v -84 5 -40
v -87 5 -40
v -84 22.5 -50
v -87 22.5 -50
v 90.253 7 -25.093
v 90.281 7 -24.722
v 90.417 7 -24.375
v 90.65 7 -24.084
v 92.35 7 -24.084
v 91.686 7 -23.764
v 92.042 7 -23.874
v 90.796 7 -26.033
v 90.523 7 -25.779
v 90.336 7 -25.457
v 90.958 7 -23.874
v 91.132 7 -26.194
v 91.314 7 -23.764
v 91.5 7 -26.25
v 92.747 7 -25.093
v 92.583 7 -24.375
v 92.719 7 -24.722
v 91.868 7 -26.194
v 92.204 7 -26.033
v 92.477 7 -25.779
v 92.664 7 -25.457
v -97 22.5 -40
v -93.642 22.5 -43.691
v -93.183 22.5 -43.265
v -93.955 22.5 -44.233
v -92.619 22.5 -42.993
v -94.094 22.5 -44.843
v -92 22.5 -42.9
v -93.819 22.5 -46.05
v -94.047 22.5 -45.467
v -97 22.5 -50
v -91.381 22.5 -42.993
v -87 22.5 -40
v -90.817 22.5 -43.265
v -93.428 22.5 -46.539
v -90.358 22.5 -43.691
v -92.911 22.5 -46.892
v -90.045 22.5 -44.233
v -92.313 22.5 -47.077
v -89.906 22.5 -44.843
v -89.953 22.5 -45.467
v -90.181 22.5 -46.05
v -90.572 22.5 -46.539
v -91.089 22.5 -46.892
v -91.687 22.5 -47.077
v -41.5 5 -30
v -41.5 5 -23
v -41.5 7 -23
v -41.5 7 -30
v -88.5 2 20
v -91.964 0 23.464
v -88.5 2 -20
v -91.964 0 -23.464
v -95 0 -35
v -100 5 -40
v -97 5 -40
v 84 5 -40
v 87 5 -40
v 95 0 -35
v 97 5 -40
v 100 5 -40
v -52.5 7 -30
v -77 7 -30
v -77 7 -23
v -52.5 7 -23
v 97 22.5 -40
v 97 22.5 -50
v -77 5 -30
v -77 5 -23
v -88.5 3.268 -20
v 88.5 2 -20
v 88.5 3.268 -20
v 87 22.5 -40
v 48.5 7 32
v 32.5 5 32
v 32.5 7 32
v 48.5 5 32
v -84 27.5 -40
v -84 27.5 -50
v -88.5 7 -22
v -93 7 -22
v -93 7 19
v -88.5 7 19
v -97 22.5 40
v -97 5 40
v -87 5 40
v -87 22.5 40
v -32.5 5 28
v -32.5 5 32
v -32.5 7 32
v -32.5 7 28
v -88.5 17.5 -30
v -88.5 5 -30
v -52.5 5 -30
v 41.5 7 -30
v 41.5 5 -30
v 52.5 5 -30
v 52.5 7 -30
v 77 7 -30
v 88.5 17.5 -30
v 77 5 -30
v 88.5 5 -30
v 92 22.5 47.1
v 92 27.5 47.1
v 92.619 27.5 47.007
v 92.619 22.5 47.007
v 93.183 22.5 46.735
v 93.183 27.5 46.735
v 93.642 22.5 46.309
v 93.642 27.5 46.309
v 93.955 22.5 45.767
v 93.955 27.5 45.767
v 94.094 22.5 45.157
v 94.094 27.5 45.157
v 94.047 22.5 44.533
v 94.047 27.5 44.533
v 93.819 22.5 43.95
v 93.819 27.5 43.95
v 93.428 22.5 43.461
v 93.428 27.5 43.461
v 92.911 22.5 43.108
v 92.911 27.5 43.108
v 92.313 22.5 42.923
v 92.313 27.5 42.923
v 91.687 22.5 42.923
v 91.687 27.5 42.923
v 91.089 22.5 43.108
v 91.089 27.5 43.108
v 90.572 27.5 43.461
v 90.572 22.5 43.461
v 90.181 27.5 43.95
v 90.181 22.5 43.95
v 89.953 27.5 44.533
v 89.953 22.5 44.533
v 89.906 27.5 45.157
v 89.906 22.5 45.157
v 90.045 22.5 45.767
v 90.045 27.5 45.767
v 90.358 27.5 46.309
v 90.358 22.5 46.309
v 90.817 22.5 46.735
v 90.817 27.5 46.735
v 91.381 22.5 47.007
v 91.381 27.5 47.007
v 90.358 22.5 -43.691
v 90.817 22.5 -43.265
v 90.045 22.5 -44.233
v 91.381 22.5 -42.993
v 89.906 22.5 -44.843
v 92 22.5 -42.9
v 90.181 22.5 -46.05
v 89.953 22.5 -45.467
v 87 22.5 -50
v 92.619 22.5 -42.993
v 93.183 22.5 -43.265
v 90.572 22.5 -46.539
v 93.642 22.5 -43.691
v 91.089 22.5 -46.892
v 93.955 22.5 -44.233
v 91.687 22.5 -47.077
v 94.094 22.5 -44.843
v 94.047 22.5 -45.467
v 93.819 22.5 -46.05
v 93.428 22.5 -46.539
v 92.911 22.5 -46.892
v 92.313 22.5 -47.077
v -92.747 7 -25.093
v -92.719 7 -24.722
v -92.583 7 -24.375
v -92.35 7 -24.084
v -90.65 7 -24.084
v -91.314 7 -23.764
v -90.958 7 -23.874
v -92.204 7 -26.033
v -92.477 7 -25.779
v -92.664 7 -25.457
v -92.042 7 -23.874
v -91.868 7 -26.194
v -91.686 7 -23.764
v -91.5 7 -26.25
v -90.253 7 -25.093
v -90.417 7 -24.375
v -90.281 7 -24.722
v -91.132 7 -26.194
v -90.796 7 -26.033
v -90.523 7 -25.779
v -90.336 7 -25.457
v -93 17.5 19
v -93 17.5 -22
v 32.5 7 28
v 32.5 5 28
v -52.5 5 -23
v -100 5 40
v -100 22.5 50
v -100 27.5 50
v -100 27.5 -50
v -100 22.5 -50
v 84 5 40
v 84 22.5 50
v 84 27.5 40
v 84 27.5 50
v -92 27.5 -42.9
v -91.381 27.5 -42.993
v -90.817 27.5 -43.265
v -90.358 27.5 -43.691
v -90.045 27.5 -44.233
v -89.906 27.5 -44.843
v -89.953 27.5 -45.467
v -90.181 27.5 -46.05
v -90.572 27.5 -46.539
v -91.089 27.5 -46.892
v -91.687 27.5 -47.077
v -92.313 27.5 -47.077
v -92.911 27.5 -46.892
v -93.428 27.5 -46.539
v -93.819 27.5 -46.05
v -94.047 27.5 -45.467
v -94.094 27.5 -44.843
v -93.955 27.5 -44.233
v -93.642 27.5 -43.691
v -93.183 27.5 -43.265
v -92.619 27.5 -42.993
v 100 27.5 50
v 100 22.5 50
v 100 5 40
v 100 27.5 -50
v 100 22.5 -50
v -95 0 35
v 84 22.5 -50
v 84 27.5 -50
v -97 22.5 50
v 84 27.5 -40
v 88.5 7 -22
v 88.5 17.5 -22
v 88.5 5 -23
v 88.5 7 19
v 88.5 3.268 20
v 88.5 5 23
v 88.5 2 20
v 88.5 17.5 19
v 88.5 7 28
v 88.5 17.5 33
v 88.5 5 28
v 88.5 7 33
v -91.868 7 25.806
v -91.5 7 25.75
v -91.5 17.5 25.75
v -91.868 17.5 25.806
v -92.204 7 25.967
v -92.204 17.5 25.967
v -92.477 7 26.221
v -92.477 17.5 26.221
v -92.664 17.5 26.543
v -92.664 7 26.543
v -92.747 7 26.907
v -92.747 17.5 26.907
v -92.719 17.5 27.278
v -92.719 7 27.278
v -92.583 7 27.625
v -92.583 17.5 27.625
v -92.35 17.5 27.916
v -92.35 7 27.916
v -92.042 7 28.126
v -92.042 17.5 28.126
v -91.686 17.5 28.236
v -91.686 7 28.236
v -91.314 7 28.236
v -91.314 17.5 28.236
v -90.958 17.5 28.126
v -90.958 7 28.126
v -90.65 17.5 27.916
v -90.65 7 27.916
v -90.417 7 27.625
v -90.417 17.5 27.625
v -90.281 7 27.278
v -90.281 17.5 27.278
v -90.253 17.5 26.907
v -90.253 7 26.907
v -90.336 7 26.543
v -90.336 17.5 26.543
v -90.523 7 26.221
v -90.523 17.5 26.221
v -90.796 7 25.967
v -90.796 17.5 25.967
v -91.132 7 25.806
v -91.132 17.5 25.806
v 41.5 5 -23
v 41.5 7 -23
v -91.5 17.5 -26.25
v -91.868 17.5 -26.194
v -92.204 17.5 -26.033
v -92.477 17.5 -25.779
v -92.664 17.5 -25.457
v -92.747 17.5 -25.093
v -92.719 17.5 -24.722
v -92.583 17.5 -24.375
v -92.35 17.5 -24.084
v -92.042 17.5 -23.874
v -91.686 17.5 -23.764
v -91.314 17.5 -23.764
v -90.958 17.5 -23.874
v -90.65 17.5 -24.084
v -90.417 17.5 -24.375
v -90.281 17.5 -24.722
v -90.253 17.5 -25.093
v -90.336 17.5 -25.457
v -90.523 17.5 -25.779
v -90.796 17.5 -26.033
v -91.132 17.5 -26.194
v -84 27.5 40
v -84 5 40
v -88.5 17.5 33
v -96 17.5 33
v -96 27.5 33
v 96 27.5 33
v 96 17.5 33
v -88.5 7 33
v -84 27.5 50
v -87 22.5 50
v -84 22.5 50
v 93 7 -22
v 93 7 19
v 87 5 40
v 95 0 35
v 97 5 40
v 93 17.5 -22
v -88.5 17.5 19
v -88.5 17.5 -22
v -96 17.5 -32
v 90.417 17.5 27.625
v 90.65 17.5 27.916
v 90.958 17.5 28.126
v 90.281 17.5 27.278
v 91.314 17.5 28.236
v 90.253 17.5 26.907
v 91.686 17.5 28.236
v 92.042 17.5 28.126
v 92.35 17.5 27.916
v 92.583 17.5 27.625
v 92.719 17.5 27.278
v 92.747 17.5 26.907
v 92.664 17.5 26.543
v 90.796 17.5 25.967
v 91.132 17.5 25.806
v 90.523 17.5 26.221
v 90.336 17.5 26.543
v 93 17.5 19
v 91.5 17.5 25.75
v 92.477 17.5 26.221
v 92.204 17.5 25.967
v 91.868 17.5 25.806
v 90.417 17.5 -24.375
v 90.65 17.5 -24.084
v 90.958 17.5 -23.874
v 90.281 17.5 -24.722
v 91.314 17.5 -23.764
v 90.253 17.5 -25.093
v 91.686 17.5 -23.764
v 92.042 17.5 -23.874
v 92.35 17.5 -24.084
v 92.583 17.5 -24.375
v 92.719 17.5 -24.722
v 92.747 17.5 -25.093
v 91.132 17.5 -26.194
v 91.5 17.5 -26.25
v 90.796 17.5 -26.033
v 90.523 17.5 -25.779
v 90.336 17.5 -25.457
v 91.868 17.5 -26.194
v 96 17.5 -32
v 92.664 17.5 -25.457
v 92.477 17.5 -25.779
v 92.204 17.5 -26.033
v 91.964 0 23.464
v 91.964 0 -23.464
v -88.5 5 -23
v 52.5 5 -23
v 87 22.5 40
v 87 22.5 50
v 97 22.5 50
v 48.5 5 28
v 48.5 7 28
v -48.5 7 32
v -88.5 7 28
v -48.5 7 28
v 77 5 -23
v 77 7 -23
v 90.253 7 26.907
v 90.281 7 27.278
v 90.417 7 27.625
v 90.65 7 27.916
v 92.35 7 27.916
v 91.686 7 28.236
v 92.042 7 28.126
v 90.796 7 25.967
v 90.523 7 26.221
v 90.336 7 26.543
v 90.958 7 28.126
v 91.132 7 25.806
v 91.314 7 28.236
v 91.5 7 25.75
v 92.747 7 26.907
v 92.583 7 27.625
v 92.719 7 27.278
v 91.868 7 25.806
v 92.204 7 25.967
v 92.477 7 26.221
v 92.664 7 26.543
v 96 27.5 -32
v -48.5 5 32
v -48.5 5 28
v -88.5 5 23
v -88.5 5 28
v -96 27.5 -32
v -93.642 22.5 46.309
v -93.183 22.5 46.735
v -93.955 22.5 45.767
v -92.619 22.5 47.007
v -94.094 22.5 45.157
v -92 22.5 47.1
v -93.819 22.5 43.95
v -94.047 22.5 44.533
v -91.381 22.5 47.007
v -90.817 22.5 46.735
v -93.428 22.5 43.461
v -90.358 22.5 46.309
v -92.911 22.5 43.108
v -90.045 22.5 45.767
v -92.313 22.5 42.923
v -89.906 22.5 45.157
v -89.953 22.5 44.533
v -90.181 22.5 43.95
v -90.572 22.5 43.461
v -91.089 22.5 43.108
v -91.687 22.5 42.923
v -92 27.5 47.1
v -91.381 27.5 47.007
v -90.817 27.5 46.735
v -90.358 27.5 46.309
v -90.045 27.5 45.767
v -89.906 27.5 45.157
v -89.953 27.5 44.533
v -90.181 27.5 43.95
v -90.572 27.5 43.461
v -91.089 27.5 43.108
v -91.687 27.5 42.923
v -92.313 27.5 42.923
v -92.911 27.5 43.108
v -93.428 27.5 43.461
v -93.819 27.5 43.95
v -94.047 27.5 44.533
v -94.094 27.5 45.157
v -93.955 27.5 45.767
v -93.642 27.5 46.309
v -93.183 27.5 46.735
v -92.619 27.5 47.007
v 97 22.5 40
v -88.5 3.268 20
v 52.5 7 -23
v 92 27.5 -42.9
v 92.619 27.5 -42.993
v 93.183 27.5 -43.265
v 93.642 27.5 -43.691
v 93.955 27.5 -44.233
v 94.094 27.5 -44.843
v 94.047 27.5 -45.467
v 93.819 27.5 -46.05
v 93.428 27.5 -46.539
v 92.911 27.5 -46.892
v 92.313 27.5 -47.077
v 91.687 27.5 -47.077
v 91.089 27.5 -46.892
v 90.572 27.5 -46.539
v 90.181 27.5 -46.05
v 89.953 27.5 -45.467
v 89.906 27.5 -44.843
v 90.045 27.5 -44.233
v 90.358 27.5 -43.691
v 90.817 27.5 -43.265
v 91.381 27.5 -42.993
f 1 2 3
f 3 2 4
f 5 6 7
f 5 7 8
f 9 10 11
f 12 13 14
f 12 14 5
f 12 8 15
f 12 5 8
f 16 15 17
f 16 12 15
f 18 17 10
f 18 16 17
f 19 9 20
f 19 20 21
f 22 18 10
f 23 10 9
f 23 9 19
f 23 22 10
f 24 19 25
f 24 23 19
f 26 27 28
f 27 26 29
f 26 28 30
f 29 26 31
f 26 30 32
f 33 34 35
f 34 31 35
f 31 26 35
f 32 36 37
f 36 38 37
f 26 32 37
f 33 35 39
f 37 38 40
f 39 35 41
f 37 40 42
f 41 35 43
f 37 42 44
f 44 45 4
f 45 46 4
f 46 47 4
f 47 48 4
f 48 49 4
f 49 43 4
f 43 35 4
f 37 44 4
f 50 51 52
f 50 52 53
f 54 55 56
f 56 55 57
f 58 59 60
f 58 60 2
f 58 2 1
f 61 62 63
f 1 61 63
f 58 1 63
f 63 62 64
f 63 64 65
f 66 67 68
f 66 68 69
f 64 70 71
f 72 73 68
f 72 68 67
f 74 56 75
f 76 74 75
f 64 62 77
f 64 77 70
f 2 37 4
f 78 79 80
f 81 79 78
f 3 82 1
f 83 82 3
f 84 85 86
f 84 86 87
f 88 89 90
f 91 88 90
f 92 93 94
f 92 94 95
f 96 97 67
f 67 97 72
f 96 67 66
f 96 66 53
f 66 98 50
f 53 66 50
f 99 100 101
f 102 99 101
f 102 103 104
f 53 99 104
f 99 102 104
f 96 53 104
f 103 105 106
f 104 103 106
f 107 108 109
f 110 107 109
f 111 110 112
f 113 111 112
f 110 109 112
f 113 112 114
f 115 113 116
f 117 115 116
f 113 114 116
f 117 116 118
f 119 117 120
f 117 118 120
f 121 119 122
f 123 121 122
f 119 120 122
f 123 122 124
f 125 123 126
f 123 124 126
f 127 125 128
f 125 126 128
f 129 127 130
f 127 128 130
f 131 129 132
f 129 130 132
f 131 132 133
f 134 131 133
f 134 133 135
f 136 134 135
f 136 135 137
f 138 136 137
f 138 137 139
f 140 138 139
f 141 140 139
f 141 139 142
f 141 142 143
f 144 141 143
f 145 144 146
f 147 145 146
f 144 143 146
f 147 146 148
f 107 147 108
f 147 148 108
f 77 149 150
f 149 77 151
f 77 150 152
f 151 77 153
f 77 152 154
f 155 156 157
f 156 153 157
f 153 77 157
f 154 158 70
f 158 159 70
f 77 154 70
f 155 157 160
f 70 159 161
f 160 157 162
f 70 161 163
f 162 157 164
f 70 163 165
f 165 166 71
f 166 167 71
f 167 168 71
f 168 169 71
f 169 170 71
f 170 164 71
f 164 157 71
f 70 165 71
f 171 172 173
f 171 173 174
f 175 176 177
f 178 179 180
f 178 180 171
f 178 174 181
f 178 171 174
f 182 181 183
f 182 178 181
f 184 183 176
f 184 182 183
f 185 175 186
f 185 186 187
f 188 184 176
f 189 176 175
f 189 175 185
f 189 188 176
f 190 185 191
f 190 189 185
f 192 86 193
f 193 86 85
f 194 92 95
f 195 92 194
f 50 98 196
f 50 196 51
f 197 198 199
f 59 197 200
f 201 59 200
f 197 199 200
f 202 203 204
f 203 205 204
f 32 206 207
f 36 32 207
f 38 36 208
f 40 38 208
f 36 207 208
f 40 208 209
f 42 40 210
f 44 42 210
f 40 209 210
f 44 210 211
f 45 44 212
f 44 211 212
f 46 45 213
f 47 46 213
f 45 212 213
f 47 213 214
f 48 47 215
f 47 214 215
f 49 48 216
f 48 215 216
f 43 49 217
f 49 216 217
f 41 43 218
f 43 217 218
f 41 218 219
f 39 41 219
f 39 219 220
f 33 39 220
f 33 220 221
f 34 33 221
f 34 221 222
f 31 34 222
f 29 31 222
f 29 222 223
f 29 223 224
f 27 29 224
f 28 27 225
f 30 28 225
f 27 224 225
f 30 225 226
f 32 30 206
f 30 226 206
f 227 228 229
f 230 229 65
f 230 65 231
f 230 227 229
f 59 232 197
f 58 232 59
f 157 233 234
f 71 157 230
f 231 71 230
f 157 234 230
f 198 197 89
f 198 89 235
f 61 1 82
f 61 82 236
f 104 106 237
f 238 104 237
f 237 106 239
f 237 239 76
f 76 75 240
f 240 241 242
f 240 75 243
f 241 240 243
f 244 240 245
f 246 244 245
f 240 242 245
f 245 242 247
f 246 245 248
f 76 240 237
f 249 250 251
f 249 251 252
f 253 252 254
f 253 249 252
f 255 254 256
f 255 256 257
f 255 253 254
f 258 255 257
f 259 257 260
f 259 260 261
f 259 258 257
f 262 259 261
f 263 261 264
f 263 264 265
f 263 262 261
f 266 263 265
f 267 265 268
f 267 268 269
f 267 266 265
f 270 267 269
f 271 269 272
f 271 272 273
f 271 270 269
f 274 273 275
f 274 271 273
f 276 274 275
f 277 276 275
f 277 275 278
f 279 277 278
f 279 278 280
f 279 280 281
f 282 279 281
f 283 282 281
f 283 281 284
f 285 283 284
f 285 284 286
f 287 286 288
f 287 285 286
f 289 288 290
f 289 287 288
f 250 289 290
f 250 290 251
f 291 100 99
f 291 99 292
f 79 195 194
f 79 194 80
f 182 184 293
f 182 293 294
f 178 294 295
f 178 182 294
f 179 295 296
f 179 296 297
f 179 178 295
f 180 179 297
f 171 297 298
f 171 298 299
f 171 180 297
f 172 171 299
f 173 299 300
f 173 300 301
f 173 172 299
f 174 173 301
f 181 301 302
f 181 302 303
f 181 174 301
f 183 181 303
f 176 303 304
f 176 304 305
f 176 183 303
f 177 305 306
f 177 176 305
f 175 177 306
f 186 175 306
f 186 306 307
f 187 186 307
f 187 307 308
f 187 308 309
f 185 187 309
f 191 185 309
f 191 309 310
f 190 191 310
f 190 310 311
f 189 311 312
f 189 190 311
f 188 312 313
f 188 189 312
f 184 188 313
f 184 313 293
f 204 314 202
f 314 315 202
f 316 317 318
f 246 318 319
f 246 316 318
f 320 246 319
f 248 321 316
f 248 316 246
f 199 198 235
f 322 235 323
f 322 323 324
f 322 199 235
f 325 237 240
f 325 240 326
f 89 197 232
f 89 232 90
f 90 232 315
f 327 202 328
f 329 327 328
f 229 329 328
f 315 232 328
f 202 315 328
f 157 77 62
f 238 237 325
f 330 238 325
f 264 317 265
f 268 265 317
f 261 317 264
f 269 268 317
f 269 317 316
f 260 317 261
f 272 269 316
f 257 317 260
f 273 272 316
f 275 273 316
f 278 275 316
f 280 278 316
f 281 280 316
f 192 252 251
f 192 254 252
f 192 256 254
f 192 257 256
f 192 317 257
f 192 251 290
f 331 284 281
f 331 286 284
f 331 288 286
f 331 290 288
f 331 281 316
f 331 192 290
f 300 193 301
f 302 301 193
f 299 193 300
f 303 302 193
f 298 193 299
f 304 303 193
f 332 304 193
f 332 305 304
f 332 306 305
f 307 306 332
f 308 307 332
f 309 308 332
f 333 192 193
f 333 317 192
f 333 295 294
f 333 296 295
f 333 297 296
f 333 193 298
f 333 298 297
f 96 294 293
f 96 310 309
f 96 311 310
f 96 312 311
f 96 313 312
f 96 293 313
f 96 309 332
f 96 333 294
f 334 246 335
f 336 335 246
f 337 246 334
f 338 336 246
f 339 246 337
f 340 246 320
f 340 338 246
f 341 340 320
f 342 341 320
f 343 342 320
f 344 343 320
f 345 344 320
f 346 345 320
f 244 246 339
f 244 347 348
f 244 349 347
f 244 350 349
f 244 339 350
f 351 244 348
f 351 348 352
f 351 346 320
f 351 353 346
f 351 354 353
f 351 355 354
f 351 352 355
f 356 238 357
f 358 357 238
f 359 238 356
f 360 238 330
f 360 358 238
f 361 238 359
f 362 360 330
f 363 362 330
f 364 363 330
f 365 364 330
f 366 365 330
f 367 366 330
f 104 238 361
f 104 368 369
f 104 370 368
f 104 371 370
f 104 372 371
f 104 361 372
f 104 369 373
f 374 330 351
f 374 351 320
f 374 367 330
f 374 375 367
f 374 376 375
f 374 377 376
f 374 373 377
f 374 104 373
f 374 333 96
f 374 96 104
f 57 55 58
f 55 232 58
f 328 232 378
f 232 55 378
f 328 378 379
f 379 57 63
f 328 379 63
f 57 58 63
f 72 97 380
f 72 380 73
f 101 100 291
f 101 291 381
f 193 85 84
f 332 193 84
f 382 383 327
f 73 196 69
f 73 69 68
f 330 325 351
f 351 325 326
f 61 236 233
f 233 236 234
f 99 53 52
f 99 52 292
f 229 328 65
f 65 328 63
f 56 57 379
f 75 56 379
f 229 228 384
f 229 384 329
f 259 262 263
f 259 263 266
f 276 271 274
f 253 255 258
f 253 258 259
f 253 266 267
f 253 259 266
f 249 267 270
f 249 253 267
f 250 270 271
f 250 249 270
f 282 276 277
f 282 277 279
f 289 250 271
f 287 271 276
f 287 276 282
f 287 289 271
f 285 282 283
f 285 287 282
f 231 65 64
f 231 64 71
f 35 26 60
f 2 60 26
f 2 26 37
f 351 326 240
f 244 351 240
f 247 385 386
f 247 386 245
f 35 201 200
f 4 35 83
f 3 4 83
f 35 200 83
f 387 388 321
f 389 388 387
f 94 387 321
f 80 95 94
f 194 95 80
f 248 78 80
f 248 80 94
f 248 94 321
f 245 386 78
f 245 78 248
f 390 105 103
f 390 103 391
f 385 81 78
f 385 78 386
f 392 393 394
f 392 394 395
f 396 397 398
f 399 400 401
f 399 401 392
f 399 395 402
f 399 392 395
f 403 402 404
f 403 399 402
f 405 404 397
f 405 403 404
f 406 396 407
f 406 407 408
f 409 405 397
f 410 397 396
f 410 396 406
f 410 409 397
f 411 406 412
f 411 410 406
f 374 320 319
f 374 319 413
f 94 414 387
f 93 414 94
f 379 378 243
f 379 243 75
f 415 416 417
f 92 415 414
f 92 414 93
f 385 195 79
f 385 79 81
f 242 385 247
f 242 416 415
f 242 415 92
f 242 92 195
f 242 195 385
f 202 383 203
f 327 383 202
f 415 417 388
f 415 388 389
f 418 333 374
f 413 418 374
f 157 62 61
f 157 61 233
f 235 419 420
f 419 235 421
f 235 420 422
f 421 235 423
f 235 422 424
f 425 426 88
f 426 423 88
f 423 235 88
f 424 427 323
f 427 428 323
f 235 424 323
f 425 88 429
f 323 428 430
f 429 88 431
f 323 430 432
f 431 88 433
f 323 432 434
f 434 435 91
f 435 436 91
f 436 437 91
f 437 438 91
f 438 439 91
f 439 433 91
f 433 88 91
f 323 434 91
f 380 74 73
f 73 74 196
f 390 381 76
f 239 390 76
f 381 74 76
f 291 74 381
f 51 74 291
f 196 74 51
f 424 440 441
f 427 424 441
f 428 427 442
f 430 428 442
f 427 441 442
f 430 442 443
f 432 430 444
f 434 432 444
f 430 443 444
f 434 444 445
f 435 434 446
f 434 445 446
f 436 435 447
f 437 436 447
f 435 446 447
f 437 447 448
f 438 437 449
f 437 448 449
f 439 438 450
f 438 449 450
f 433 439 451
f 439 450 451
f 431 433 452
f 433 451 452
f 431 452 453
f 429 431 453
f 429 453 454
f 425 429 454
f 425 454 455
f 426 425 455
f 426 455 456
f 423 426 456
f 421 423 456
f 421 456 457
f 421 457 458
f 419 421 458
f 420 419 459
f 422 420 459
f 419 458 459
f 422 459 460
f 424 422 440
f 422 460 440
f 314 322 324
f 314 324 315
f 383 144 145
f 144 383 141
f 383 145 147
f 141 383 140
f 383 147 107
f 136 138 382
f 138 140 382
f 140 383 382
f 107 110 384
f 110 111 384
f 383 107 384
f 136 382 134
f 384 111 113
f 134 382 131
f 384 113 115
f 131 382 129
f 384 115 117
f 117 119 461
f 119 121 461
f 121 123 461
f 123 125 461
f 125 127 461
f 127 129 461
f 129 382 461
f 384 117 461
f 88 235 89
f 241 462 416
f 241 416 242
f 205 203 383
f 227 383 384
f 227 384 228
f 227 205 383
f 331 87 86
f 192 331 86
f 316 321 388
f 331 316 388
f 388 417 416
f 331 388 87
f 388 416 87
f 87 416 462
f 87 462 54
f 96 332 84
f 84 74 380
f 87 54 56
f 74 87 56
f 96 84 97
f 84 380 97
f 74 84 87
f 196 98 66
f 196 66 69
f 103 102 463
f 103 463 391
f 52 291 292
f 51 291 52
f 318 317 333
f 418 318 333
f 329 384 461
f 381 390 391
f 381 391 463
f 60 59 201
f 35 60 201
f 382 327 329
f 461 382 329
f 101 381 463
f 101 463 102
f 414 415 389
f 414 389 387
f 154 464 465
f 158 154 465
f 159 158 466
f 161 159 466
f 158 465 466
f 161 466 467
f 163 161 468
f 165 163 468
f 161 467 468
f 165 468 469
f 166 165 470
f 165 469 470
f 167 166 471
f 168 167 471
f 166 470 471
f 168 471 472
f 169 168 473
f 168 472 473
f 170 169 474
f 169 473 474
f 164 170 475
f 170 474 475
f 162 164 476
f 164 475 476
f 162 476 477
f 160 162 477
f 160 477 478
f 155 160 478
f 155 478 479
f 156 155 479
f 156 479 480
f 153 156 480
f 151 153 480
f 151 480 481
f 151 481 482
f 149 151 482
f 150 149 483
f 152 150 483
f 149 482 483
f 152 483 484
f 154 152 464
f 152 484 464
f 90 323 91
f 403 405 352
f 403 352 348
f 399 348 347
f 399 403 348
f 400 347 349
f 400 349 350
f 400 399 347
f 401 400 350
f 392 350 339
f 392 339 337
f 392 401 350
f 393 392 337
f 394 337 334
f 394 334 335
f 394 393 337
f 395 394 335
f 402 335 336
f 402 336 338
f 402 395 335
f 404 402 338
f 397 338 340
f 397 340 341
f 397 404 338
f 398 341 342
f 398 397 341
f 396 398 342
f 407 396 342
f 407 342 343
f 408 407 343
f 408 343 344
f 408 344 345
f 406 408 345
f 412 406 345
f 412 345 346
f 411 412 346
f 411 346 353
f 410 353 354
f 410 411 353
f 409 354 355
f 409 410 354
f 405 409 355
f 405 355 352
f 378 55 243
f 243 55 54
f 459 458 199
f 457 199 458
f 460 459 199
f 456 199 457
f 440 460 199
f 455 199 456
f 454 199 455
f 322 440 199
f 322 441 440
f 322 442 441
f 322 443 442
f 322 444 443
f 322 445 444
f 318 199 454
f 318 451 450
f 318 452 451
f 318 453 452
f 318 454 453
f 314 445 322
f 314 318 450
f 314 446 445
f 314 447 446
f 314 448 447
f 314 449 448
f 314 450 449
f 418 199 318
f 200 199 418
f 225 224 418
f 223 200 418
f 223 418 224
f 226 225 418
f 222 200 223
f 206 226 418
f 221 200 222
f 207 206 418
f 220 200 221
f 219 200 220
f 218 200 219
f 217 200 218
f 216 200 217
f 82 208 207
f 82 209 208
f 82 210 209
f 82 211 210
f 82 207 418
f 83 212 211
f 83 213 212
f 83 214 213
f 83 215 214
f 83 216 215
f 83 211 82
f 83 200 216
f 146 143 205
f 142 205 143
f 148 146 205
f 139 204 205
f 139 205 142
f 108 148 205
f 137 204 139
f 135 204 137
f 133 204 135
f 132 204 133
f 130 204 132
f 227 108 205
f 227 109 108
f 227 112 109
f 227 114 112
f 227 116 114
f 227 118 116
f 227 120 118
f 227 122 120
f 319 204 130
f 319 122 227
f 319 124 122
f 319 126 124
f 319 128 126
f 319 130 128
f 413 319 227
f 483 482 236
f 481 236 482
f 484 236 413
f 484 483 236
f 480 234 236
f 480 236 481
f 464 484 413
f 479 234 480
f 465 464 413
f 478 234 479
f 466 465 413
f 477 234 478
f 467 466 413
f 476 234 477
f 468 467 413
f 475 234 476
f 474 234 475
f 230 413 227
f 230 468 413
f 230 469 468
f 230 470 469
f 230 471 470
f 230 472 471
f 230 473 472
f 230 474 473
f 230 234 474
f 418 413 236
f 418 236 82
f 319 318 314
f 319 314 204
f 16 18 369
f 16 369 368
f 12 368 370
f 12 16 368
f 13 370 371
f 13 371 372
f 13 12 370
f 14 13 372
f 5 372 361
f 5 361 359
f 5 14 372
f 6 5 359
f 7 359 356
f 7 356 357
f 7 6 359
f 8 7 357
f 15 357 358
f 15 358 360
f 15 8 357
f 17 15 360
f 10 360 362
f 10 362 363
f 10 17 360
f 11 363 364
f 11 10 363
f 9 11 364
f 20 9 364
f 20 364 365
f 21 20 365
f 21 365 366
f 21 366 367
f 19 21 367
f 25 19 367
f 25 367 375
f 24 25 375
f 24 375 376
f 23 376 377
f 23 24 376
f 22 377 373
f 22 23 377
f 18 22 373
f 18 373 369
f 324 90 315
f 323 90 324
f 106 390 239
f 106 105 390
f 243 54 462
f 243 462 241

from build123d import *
from OCP.BRepFilletAPI import BRepFilletAPI_MakeChamfer

# Parameters (mm, degrees)
SKETCH_1_W          = 200
SKETCH_1_H          = 80
SKETCH_1_W_2        = 177
SKETCH_1_H_2        = 40
EXTRUDE_1_DEPTH     = 5
CHAMFER_1_SIZE      = 3
CHAMFER_1_SIZE2     = 1.732050808
SKETCH_2_W          = 200
SKETCH_2_H          = 80
EXTRUDE_2_DEPTH     = 2
SKETCH_3_W          = 200
SKETCH_3_H          = 80
SKETCH_3_R          = 1.25
EXTRUDE_3_DEPTH     = 10.5
SKETCH_4_W          = 200
SKETCH_4_H          = 80
SKETCH_4_W_2        = 192
SKETCH_4_H_2        = 65
EXTRUDE_4_DEPTH     = 10
CHAMFER_2_SIZE      = 5
SKETCH_6_W          = 16
SKETCH_6_H          = 10
SKETCH_6_R          = 2.1
EXTRUDE_6_DEPTH     = 5
EXTRUDE_9_DEPTH     = 16
EXTRUDE_10_DEPTH    = 16
SKETCH_12_W         = 10
SKETCH_12_H         = 10
CUT_EXTRUDE_2_DEPTH = 22
CHAMFER_3_SIZE      = 2
CHAMFER_3_SIZE2     = 3.464101615


with BuildPart() as part:
    # Эскиз1 → Бобышка-Вытянуть1 (new body)
    with BuildSketch(Plane(origin=(0, 0, 0), x_dir=(1, 0, 0), z_dir=(0, 1, 0))):
        Rectangle(SKETCH_1_W, SKETCH_1_H)
        Rectangle(SKETCH_1_W_2, SKETCH_1_H_2, mode=Mode.SUBTRACT)
    extrude(amount=EXTRUDE_1_DEPTH)

    # Фаска1
    chamfer_1_edges = [part.edges().sort_by_distance(p)[0] for p in [
        (0, 5, -20),
        (0, 5, 20),
    ]]
    chamfer_1_side = [part.faces().sort_by_distance(p)[0] for p in [
        (0, 5, -37.845934077),
    ]]
    chamfer(chamfer_1_edges, length=CHAMFER_1_SIZE, length2=CHAMFER_1_SIZE2, reference=chamfer_1_side[0])

    # Эскиз2 → Бобышка-Вытянуть2 (add)
    with BuildSketch(Plane(origin=(0, 5, 0), x_dir=(1, 0, 0), z_dir=(0, 1, 0))):
        Rectangle(SKETCH_2_W, SKETCH_2_H)
        Polygon((-88.5, 30), (-88.5, -28), (-48.5, -28), (-48.5, -32), (-32.5, -32), (-32.5, -28), (32.5, -28), (32.5, -32), (48.5, -32), (48.5, -28), (88.5, -28), (88.5, 30), (77, 30), (77, 23), (52.5, 23), (52.5, 30), (41.5, 30), (41.5, 23), (-41.5, 23), (-41.5, 30), (-52.5, 30), (-52.5, 23), (-77, 23), (-77, 30), align=None, mode=Mode.SUBTRACT)
    extrude(amount=EXTRUDE_2_DEPTH)

    # Эскиз3 → Бобышка-Вытянуть3 (add)
    with BuildSketch(Plane(origin=(0, 7, 0), x_dir=(1, 0, 0), z_dir=(0, 1, 0))):
        Rectangle(SKETCH_3_W, SKETCH_3_H)
        with Locations(Location((-91.5, 25, 0), (0, 0, 90))):
            Circle(SKETCH_3_R, mode=Mode.SUBTRACT)
        with Locations(Location((91.5, 25, 0), (0, 0, 90))):
            Circle(SKETCH_3_R, mode=Mode.SUBTRACT)
        with Locations(Location((-91.5, -27, 0), (0, 0, 90))):
            Circle(SKETCH_3_R, mode=Mode.SUBTRACT)
        with Locations(Location((91.5, -27, 0), (0, 0, 90))):
            Circle(SKETCH_3_R, mode=Mode.SUBTRACT)
        Polygon((-93, 22), (-88.5, 22), (-88.5, 30), (88.5, 30), (88.5, 22), (93, 22), (93, -19), (88.5, -19), (88.5, -33), (-88.5, -33), (-88.5, -19), (-93, -19), align=None, mode=Mode.SUBTRACT)
    extrude(amount=EXTRUDE_3_DEPTH)

    # Эскиз4 → Бобышка-Вытянуть4 (add)
    with BuildSketch(Plane(origin=(0, 17.5, 0), x_dir=(1, 0, 0), z_dir=(0, 1, 0))):
        Rectangle(SKETCH_4_W, SKETCH_4_H)
        with Locations((0, -0.5)):
            Rectangle(SKETCH_4_W_2, SKETCH_4_H_2, mode=Mode.SUBTRACT)
    extrude(amount=EXTRUDE_4_DEPTH)

    # Фаска2
    chamfer_2_edges = [part.edges().sort_by_distance(p)[0] for p in [
        (0, 0, -40),
        (100, 0, 0),
        (0, 0, 40),
        (-100, 0, 0),
    ]]
    chamfer(chamfer_2_edges, length=CHAMFER_2_SIZE)

    # Эскиз6 → Бобышка-Вытянуть6 (add)
    # profile 1 of 4: a face of its own
    with BuildSketch(Plane(origin=(0, 27.5, 0), x_dir=(1, 0, 0), z_dir=(0, 1, 0))):
        with Locations((-92, 45)):
            Rectangle(SKETCH_6_W, SKETCH_6_H)
        with Locations(Location((-92, 45, 0), (0, 0, 270))):
            Circle(SKETCH_6_R, mode=Mode.SUBTRACT)
    # profile 2 of 4: a face of its own
    with BuildSketch(Plane(origin=(0, 27.5, 0), x_dir=(1, 0, 0), z_dir=(0, 1, 0))):
        with Locations((92, 45)):
            Rectangle(SKETCH_6_W, SKETCH_6_H)
        with Locations(Location((92, 45, 0), (0, 0, 270))):
            Circle(SKETCH_6_R, mode=Mode.SUBTRACT)
    # profile 3 of 4: a face of its own
    with BuildSketch(Plane(origin=(0, 27.5, 0), x_dir=(1, 0, 0), z_dir=(0, 1, 0))):
        with Locations((92, -45)):
            Rectangle(SKETCH_6_W, SKETCH_6_H)
        with Locations(Location((92, -45, 0), (0, 0, 270))):
            Circle(SKETCH_6_R, mode=Mode.SUBTRACT)
    # profile 4 of 4: a face of its own
    with BuildSketch(Plane(origin=(0, 27.5, 0), x_dir=(1, 0, 0), z_dir=(0, 1, 0))):
        with Locations((-92, -45)):
            Rectangle(SKETCH_6_W, SKETCH_6_H)
        with Locations(Location((-92, -45, 0), (0, 0, 270))):
            Circle(SKETCH_6_R, mode=Mode.SUBTRACT)
    extrude(amount=-EXTRUDE_6_DEPTH)

    # Эскиз10 → Бобышка-Вытянуть9 (add)
    with BuildSketch(Plane(origin=(100, 0, 0), x_dir=(0, 0, -1), z_dir=(1, 0, 0))):
        Polygon((-50, 22.5), (-40, 5), (-40, 22.5), align=None)
        Polygon((40, 5), (50, 22.5), (40, 22.5), align=None)
    extrude(amount=-EXTRUDE_9_DEPTH)

    # Эскиз11 → Бобышка-Вытянуть10 (add)
    with BuildSketch(Plane.ZY.offset(100)):
        Polygon((-50, 22.5), (-40, 22.5), (-40, 5), align=None)
        Polygon((40, 5), (50, 22.5), (40, 22.5), align=None)
    extrude(amount=-EXTRUDE_10_DEPTH)

    # Эскиз12 → Вырез-Вытянуть2 (cut)
    with BuildSketch(Plane(origin=(0, 22.5, 0), x_dir=(1, 0, 0), z_dir=(0, 1, 0))):
        with Locations((-92, -45)):
            Rectangle(SKETCH_12_W, SKETCH_12_H)
        with Locations((-92, 45)):
            Rectangle(SKETCH_12_W, SKETCH_12_H)
        with Locations((92, 45)):
            Rectangle(SKETCH_12_W, SKETCH_12_H)
        with Locations((92, -45)):
            Rectangle(SKETCH_12_W, SKETCH_12_H)
    extrude(amount=-CUT_EXTRUDE_2_DEPTH, mode=Mode.SUBTRACT)

    # Фаска3: one chamfer whose edges measure the first distance from different faces: ONE call of the kernel's chamfer builder (chamfer() names one face for all edges)
    chamfer_3_edges_1 = [part.edges().sort_by_distance(p)[0] for p in [
        (88.5, 0, 0),
    ]]
    chamfer_3_side_1 = [part.faces().sort_by_distance(p)[0] for p in [
        (88.5, 1.633974596, -19.346146041),
    ]]
    chamfer_3_edges_2 = [part.edges().sort_by_distance(p)[0] for p in [
        (0, 0, -20),
    ]]
    chamfer_3_side_2 = [part.faces().sort_by_distance(p)[0] for p in [
        (0, 1.633974596, -20),
    ]]
    chamfer_3_edges_3 = [part.edges().sort_by_distance(p)[0] for p in [
        (-88.5, 0, 0),
    ]]
    chamfer_3_side_3 = [part.faces().sort_by_distance(p)[0] for p in [
        (-88.5, 1.633974596, 19.346146041),
    ]]
    chamfer_3_edges_4 = [part.edges().sort_by_distance(p)[0] for p in [
        (0, 0, 20),
    ]]
    chamfer_3_side_4 = [part.faces().sort_by_distance(p)[0] for p in [
        (0, 1.633974596, 20),
    ]]
    chamfer_3 = BRepFilletAPI_MakeChamfer(part.part.solid().wrapped)
    for e in chamfer_3_edges_1:
        chamfer_3.Add(CHAMFER_3_SIZE, CHAMFER_3_SIZE2, e.wrapped, chamfer_3_side_1[0].wrapped)  # the first distance lies on this face
    for e in chamfer_3_edges_2:
        chamfer_3.Add(CHAMFER_3_SIZE, CHAMFER_3_SIZE2, e.wrapped, chamfer_3_side_2[0].wrapped)  # the first distance lies on this face
    for e in chamfer_3_edges_3:
        chamfer_3.Add(CHAMFER_3_SIZE, CHAMFER_3_SIZE2, e.wrapped, chamfer_3_side_3[0].wrapped)  # the first distance lies on this face
    for e in chamfer_3_edges_4:
        chamfer_3.Add(CHAMFER_3_SIZE, CHAMFER_3_SIZE2, e.wrapped, chamfer_3_side_4[0].wrapped)  # the first distance lies on this face
    add(Compound.cast(chamfer_3.Shape()), mode=Mode.REPLACE)


solid = part.part
